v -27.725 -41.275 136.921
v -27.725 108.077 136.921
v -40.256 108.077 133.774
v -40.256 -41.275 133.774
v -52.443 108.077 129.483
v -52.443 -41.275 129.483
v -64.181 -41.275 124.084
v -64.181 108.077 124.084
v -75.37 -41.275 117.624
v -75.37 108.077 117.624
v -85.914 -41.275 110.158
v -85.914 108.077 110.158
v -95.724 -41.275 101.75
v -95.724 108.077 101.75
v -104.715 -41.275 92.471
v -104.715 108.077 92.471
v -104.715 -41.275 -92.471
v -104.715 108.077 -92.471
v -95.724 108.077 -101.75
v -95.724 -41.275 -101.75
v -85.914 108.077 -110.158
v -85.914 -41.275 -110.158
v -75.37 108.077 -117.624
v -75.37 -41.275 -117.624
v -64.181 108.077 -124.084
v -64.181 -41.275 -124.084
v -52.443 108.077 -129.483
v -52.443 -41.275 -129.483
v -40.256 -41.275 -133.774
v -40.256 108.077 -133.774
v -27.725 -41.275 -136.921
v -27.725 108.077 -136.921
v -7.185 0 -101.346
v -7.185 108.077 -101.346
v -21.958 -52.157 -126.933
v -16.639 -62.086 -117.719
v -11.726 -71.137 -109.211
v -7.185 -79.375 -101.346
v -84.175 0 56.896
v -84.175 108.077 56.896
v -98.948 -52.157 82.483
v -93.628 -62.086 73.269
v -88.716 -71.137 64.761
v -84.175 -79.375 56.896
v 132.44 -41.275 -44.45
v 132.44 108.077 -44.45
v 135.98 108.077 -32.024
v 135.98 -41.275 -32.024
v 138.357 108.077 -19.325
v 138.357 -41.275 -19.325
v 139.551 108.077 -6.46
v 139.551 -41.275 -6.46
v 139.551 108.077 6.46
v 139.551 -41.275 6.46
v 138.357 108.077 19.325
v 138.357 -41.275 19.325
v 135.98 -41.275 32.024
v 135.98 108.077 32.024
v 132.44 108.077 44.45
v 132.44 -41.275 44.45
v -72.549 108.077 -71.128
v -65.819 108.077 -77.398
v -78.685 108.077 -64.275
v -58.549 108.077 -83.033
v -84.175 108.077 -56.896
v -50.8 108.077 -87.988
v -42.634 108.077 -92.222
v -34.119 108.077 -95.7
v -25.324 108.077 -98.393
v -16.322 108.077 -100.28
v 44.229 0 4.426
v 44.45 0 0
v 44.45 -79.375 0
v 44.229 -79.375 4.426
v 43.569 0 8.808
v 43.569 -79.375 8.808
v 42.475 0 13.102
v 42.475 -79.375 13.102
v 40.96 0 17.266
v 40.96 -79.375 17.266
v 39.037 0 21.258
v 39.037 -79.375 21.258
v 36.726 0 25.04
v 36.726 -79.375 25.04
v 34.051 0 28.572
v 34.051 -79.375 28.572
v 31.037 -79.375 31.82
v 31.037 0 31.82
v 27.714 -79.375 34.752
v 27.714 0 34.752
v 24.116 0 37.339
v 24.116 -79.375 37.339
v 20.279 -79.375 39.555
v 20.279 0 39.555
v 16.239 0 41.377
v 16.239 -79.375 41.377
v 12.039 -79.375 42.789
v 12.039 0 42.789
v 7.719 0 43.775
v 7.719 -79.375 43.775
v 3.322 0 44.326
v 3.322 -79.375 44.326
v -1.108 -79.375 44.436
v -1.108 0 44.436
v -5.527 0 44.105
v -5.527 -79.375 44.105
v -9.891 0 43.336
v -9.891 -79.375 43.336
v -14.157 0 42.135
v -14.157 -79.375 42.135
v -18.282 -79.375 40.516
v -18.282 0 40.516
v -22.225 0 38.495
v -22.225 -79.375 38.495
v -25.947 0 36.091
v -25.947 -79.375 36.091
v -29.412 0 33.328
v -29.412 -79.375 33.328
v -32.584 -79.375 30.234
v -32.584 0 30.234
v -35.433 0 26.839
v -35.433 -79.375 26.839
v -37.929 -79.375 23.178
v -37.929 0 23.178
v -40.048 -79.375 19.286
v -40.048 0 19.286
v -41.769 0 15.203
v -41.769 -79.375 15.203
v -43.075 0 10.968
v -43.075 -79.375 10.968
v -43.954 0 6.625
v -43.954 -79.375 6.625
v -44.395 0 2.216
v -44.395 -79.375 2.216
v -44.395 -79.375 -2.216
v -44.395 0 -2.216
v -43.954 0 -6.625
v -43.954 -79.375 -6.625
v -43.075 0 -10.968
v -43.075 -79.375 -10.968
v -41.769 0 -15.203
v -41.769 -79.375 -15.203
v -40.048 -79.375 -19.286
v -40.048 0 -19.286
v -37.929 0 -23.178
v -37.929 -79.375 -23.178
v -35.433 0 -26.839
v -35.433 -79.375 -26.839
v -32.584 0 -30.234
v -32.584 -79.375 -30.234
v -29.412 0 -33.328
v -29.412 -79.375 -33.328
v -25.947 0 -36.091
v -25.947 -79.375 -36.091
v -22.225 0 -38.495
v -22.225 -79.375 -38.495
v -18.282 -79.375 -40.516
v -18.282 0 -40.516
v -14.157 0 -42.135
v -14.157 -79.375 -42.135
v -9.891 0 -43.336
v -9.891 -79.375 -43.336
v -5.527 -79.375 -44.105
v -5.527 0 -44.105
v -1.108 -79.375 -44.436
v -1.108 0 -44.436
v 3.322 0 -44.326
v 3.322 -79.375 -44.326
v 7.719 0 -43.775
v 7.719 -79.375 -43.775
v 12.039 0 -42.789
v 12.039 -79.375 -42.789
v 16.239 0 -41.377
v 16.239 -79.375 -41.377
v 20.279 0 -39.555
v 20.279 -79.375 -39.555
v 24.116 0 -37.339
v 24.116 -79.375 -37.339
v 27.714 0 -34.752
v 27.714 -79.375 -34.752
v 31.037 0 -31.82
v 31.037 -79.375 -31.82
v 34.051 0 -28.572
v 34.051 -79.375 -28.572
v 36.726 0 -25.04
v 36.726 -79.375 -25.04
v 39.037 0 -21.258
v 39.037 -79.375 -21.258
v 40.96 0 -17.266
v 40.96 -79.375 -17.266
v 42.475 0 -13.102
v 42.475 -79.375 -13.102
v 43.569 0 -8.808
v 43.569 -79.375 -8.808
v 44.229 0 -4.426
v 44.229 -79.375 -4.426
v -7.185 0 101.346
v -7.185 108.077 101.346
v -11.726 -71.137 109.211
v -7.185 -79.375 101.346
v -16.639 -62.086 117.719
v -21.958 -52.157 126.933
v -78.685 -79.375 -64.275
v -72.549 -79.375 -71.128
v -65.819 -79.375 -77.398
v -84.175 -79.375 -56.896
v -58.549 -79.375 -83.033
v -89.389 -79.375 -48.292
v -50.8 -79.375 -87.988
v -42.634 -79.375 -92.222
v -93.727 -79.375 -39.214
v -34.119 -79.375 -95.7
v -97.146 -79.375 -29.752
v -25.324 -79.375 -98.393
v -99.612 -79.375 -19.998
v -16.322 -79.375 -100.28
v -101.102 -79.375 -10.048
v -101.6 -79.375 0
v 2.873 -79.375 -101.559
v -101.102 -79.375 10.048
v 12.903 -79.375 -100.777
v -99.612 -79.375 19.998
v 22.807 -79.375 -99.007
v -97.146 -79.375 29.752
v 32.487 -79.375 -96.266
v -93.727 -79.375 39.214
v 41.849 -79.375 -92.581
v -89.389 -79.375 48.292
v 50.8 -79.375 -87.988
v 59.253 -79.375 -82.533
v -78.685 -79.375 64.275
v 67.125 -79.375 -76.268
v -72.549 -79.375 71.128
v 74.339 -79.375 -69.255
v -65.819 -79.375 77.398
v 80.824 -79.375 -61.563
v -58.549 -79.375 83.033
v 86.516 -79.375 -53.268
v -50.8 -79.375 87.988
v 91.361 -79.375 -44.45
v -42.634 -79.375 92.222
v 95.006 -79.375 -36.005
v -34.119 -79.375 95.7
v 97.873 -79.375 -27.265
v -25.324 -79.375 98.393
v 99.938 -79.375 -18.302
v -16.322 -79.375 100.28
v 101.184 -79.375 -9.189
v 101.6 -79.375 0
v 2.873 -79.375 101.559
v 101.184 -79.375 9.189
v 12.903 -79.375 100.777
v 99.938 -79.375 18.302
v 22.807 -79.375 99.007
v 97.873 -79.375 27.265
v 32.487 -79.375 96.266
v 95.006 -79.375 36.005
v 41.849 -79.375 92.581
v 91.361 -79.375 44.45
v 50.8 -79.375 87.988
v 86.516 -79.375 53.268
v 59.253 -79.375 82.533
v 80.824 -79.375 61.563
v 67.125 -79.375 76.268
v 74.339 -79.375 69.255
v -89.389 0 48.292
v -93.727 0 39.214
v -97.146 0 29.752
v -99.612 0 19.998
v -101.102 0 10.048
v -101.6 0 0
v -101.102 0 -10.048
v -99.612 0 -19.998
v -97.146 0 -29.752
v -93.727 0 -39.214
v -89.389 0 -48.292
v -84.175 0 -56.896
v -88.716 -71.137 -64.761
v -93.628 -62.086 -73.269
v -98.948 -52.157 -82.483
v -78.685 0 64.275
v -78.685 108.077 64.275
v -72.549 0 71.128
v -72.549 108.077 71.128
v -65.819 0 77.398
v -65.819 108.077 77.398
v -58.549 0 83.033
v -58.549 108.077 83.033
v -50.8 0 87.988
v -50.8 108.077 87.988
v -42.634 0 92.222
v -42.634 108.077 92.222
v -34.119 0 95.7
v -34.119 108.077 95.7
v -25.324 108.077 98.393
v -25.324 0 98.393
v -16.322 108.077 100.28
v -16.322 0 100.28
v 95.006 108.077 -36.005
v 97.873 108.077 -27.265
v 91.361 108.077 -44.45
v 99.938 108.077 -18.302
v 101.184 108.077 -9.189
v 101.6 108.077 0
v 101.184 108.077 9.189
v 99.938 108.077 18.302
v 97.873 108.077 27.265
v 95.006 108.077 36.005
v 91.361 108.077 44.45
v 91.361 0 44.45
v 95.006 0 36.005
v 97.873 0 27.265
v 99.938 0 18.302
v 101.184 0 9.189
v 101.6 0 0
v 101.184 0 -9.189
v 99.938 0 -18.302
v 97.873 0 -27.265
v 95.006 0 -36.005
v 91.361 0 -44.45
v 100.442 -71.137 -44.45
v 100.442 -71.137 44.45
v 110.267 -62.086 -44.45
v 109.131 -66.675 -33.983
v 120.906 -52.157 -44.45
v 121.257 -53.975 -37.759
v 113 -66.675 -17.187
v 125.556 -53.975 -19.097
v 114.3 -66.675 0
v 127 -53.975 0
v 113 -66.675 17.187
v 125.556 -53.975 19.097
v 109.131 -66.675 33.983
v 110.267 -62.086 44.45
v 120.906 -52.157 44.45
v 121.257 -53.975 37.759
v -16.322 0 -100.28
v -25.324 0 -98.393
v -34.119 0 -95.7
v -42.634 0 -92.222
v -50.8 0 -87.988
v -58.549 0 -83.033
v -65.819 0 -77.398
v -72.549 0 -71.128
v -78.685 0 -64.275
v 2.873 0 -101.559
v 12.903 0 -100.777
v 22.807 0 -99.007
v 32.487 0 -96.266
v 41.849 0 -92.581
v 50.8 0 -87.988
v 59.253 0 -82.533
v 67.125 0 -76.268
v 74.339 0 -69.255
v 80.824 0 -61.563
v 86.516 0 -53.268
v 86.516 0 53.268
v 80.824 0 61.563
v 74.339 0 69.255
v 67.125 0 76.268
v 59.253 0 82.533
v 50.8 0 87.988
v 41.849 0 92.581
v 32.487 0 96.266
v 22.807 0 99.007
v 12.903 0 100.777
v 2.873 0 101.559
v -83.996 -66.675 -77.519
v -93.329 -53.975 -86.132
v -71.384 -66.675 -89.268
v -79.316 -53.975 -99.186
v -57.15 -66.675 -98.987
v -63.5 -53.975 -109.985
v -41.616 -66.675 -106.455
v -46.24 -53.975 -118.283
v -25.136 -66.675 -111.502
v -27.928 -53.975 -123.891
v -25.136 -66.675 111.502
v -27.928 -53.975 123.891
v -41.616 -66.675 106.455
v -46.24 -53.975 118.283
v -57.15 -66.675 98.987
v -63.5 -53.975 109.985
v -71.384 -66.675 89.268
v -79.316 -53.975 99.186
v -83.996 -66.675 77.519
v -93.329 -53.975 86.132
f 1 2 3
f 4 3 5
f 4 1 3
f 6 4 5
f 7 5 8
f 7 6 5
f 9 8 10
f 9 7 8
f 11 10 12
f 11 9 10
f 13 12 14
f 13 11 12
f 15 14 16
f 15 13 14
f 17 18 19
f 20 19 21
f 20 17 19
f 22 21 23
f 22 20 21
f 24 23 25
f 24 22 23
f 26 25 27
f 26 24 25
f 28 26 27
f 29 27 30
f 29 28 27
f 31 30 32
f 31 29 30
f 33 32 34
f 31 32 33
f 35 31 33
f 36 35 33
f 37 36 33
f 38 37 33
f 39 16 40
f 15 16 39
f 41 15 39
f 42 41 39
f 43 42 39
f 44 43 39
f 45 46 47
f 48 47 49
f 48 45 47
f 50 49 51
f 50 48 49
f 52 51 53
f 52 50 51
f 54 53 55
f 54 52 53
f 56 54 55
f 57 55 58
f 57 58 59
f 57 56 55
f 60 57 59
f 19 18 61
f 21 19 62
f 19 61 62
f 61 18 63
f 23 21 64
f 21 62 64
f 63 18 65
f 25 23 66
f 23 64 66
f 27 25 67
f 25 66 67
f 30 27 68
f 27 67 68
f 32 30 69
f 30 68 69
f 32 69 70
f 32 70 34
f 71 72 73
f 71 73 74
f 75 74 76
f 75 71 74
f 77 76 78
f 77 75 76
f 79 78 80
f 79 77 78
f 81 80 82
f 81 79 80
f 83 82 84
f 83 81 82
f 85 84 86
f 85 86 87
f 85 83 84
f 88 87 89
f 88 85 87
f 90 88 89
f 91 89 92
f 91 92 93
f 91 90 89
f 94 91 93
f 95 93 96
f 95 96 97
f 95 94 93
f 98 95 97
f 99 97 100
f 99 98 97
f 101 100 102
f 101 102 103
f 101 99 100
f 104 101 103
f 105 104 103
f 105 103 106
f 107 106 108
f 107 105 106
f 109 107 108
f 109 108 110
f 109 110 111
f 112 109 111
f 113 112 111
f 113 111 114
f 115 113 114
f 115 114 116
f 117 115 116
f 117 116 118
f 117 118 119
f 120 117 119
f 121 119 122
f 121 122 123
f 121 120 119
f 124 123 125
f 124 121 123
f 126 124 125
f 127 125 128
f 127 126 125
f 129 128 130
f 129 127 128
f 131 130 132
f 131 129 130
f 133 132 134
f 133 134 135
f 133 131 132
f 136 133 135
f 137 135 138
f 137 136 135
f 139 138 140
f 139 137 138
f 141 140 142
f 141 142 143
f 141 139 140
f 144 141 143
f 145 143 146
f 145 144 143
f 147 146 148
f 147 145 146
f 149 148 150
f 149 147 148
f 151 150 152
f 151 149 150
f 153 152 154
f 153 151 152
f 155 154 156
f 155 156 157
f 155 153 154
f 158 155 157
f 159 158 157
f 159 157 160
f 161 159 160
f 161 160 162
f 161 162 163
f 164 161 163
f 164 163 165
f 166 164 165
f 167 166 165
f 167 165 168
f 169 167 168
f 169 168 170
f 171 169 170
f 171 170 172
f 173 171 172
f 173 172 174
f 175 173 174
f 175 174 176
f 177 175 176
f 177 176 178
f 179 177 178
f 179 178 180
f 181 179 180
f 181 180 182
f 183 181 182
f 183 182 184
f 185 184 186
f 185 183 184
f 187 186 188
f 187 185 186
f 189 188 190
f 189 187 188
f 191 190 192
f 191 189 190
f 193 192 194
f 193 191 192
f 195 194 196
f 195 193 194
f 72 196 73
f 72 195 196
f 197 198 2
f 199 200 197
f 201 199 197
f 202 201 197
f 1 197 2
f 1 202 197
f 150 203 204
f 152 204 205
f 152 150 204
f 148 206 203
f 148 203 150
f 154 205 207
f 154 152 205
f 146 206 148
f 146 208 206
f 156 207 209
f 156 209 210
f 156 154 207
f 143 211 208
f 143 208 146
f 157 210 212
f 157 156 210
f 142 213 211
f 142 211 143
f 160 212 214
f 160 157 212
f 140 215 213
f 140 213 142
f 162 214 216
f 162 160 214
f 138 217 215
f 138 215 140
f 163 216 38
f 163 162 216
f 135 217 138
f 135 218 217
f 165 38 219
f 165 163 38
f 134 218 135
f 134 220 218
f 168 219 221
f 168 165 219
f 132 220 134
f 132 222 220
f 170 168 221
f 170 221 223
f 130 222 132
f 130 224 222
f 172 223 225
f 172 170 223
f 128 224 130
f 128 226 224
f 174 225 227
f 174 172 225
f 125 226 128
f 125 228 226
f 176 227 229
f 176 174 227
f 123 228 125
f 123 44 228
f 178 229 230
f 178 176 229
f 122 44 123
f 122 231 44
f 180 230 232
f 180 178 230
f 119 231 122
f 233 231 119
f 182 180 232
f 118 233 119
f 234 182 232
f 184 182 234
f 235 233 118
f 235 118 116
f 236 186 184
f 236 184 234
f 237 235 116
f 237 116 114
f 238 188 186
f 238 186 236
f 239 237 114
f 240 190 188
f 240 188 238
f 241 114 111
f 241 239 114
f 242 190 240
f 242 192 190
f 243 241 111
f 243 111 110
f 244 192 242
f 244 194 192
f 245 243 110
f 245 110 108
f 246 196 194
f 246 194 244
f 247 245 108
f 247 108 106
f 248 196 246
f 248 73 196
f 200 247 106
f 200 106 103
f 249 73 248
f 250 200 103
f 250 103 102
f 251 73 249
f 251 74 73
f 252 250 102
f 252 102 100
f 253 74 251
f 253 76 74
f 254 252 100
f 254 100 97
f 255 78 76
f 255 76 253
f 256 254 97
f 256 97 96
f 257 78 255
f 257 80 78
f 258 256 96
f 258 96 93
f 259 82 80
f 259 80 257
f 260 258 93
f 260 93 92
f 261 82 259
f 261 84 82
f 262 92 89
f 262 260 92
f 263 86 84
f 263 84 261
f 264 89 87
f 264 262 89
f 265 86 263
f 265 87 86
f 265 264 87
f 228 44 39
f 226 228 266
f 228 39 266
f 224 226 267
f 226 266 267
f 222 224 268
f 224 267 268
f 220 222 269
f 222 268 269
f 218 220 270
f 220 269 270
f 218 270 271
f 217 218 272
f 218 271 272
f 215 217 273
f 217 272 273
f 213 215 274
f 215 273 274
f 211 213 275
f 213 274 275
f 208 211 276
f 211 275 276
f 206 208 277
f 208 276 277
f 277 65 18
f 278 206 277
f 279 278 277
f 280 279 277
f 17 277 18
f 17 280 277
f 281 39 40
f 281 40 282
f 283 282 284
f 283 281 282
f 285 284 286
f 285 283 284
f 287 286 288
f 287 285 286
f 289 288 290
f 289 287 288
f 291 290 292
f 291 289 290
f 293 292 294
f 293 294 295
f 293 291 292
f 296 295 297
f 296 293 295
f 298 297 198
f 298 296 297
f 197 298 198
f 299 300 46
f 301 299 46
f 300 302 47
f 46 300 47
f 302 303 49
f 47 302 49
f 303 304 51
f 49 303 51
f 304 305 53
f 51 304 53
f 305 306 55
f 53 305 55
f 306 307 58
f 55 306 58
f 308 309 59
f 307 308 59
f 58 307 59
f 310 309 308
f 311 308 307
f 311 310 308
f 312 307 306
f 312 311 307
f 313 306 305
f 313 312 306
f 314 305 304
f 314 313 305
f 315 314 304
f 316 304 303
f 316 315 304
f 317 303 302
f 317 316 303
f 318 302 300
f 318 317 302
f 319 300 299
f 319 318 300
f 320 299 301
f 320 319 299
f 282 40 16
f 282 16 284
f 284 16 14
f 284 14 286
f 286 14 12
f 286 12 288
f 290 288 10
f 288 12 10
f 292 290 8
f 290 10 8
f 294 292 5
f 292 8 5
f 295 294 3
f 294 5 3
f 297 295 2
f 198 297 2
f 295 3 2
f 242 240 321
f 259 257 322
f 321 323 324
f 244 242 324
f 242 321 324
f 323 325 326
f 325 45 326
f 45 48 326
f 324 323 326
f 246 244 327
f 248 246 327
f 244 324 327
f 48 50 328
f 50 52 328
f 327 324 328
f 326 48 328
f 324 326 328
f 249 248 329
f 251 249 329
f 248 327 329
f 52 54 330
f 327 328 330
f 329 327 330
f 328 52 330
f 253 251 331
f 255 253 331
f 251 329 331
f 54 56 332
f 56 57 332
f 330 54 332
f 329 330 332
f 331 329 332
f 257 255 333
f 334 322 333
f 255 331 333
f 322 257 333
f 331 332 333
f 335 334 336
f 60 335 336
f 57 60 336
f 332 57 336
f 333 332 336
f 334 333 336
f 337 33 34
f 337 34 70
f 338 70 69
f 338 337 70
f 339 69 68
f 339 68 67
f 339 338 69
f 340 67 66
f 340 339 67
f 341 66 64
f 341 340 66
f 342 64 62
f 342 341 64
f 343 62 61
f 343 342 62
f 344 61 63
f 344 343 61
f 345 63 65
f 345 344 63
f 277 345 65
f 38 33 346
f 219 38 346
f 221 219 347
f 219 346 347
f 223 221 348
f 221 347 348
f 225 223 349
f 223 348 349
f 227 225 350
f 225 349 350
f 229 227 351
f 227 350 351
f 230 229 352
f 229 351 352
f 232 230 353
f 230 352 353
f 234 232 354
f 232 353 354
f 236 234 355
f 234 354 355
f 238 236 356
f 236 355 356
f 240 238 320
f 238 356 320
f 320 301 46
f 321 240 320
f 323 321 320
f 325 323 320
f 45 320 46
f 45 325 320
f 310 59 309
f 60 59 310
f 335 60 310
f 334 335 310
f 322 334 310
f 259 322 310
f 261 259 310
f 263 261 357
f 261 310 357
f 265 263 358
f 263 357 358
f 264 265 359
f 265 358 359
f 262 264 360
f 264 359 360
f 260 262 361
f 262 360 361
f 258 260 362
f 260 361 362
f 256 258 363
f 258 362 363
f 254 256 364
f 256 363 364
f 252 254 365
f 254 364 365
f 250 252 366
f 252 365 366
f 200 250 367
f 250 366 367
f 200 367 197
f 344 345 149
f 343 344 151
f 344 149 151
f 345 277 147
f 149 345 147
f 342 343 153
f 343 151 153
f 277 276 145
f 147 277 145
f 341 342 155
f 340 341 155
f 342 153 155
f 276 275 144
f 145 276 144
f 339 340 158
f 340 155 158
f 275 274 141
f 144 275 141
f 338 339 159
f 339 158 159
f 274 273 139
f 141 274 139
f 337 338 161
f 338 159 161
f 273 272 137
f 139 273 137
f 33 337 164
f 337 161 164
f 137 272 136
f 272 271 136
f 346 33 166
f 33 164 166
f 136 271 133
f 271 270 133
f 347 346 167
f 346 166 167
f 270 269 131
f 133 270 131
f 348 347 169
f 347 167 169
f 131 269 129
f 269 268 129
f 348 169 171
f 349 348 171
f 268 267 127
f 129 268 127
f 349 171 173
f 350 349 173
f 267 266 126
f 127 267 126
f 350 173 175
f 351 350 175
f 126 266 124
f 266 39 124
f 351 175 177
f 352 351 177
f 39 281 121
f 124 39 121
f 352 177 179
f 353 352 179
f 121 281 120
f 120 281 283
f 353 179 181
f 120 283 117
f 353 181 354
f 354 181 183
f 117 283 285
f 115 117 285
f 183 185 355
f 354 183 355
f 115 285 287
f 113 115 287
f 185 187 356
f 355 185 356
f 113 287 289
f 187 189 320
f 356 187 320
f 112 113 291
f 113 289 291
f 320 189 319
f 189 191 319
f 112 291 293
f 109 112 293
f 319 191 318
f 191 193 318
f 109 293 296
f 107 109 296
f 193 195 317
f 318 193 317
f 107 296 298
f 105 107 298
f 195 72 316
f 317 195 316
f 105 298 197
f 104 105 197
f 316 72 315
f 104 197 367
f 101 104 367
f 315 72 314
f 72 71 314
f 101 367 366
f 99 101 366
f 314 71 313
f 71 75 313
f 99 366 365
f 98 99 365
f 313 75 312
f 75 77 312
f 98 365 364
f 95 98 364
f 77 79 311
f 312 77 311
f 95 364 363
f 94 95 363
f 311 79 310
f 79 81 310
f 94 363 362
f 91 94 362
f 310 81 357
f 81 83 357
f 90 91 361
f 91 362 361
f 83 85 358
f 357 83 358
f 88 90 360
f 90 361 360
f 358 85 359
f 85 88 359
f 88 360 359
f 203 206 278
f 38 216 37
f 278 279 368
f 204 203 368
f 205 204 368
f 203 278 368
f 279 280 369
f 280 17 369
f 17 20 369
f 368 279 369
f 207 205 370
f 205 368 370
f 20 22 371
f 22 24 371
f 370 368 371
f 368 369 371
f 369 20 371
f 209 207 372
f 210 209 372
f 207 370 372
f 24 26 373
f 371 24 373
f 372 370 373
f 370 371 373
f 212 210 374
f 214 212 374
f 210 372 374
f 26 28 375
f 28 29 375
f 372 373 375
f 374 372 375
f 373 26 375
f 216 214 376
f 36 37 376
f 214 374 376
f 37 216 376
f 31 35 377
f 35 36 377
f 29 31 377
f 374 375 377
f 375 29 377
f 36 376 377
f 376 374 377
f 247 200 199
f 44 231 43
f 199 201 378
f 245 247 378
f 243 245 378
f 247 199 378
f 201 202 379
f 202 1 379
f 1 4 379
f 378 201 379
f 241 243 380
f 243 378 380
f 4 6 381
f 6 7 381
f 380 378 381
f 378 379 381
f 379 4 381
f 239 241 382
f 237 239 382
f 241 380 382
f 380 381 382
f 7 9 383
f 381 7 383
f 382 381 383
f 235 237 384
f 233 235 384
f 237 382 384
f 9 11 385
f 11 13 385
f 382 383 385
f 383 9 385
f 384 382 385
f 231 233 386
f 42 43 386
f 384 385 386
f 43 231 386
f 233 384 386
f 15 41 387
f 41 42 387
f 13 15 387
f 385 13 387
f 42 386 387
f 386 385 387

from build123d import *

# Parameters (mm, degrees)
F0_R        = 101.6
F0_R_2      = 44.45
F1_DEPTH    = 79.375
F3_DEPTH    = 187.452
F4_SIZE     = 38.1
F5_T2_ANGLE = 117.4823583848
F6_T2_ANGLE = 117.4823583848


# Not quite as in the source:
# - a fillet or chamfer that OpenCascade refuses, or shapes differently, is made with other operations: its cross-section is extruded or revolved along the edge and cut away or added


with BuildPart() as f1:
    # F0 (on Front) → F1 (new body)
    with BuildSketch(Plane.XZ):
        Circle(F0_R)
        Circle(F0_R_2, mode=Mode.SUBTRACT)
    extrude(amount=F1_DEPTH)

    # F2 (on face) → F3 (join)
    with BuildSketch(Plane.XZ.offset(79.375)):
        with BuildLine():
            Line((132.4397504528, 44.45), (91.3605905191, 44.45))
            ThreePointArc((91.3605905191, 44.45), (101.6, 0), (91.3605905191, -44.45))
            Line((91.3605905191, -44.45), (132.4397504528, -44.45))
            ThreePointArc((132.4397504528, -44.45), (139.7, 0), (132.4397504528, 44.45))
        make_face()
        with BuildLine():
            Line((-104.7147044246, 92.471188363), (-84.1751244578, 56.8955922943))
            ThreePointArc((-84.1751244578, 56.8955922943), (-50.8, 87.9881810245), (-7.1854660613, 101.3455922943))
            Line((-7.1854660613, 101.3455922943), (-27.7250460282, 136.921188363))
            ThreePointArc((-27.7250460282, 136.921188363), (-69.85, 120.9837489087), (-104.7147044246, 92.471188363))
        make_face()
        with BuildLine():
            Line((-27.7250460282, -136.921188363), (-7.1854660613, -101.3455922943))
            ThreePointArc((-7.1854660613, -101.3455922943), (-50.8, -87.9881810245), (-84.1751244578, -56.8955922943))
            Line((-84.1751244578, -56.8955922943), (-104.7147044246, -92.471188363))
            ThreePointArc((-104.7147044246, -92.471188363), (-69.85, -120.9837489087), (-27.7250460282, -136.921188363))
        make_face()
    extrude(amount=-F3_DEPTH)

    # F4
    f4_edges = [f1.edges().sort_by_distance(p)[0] for p in [
        (139.7, -79.375, 0),
    ]]
    chamfer(f4_edges, length=F4_SIZE)

    # F5: chamfer of 38.1 on 1 edges, made by hand

    # F5_s1 → F5_t2 (revolve, cut)
    with BuildSketch(Plane(origin=(0, 0, 0), x_dir=(0, 1, 0), z_dir=(-0.0219688003, 0, 0.9997586568))):
        Polygon((-79.375, 101.6), (-41.275, 139.7), (-79.375, 139.7), align=None)
    revolve(axis=Axis((0, -79.375, 0), (0, -1, 0)), revolution_arc=F5_T2_ANGLE, mode=Mode.SUBTRACT)

    # F6: chamfer of 38.1 on 1 edges, made by hand

    # F6_s1 → F6_t2 (revolve, cut)
    with BuildSketch(Plane(origin=(0, 0, 0), x_dir=(0, 1, 0), z_dir=(0.8768007946, 0, -0.4808537893))):
        Polygon((-79.375, 101.6), (-41.275, 139.7), (-79.375, 139.7), align=None)
    revolve(axis=Axis((0, -79.375, 0), (0, -1, 0)), revolution_arc=F6_T2_ANGLE, mode=Mode.SUBTRACT)


solid = f1.part
